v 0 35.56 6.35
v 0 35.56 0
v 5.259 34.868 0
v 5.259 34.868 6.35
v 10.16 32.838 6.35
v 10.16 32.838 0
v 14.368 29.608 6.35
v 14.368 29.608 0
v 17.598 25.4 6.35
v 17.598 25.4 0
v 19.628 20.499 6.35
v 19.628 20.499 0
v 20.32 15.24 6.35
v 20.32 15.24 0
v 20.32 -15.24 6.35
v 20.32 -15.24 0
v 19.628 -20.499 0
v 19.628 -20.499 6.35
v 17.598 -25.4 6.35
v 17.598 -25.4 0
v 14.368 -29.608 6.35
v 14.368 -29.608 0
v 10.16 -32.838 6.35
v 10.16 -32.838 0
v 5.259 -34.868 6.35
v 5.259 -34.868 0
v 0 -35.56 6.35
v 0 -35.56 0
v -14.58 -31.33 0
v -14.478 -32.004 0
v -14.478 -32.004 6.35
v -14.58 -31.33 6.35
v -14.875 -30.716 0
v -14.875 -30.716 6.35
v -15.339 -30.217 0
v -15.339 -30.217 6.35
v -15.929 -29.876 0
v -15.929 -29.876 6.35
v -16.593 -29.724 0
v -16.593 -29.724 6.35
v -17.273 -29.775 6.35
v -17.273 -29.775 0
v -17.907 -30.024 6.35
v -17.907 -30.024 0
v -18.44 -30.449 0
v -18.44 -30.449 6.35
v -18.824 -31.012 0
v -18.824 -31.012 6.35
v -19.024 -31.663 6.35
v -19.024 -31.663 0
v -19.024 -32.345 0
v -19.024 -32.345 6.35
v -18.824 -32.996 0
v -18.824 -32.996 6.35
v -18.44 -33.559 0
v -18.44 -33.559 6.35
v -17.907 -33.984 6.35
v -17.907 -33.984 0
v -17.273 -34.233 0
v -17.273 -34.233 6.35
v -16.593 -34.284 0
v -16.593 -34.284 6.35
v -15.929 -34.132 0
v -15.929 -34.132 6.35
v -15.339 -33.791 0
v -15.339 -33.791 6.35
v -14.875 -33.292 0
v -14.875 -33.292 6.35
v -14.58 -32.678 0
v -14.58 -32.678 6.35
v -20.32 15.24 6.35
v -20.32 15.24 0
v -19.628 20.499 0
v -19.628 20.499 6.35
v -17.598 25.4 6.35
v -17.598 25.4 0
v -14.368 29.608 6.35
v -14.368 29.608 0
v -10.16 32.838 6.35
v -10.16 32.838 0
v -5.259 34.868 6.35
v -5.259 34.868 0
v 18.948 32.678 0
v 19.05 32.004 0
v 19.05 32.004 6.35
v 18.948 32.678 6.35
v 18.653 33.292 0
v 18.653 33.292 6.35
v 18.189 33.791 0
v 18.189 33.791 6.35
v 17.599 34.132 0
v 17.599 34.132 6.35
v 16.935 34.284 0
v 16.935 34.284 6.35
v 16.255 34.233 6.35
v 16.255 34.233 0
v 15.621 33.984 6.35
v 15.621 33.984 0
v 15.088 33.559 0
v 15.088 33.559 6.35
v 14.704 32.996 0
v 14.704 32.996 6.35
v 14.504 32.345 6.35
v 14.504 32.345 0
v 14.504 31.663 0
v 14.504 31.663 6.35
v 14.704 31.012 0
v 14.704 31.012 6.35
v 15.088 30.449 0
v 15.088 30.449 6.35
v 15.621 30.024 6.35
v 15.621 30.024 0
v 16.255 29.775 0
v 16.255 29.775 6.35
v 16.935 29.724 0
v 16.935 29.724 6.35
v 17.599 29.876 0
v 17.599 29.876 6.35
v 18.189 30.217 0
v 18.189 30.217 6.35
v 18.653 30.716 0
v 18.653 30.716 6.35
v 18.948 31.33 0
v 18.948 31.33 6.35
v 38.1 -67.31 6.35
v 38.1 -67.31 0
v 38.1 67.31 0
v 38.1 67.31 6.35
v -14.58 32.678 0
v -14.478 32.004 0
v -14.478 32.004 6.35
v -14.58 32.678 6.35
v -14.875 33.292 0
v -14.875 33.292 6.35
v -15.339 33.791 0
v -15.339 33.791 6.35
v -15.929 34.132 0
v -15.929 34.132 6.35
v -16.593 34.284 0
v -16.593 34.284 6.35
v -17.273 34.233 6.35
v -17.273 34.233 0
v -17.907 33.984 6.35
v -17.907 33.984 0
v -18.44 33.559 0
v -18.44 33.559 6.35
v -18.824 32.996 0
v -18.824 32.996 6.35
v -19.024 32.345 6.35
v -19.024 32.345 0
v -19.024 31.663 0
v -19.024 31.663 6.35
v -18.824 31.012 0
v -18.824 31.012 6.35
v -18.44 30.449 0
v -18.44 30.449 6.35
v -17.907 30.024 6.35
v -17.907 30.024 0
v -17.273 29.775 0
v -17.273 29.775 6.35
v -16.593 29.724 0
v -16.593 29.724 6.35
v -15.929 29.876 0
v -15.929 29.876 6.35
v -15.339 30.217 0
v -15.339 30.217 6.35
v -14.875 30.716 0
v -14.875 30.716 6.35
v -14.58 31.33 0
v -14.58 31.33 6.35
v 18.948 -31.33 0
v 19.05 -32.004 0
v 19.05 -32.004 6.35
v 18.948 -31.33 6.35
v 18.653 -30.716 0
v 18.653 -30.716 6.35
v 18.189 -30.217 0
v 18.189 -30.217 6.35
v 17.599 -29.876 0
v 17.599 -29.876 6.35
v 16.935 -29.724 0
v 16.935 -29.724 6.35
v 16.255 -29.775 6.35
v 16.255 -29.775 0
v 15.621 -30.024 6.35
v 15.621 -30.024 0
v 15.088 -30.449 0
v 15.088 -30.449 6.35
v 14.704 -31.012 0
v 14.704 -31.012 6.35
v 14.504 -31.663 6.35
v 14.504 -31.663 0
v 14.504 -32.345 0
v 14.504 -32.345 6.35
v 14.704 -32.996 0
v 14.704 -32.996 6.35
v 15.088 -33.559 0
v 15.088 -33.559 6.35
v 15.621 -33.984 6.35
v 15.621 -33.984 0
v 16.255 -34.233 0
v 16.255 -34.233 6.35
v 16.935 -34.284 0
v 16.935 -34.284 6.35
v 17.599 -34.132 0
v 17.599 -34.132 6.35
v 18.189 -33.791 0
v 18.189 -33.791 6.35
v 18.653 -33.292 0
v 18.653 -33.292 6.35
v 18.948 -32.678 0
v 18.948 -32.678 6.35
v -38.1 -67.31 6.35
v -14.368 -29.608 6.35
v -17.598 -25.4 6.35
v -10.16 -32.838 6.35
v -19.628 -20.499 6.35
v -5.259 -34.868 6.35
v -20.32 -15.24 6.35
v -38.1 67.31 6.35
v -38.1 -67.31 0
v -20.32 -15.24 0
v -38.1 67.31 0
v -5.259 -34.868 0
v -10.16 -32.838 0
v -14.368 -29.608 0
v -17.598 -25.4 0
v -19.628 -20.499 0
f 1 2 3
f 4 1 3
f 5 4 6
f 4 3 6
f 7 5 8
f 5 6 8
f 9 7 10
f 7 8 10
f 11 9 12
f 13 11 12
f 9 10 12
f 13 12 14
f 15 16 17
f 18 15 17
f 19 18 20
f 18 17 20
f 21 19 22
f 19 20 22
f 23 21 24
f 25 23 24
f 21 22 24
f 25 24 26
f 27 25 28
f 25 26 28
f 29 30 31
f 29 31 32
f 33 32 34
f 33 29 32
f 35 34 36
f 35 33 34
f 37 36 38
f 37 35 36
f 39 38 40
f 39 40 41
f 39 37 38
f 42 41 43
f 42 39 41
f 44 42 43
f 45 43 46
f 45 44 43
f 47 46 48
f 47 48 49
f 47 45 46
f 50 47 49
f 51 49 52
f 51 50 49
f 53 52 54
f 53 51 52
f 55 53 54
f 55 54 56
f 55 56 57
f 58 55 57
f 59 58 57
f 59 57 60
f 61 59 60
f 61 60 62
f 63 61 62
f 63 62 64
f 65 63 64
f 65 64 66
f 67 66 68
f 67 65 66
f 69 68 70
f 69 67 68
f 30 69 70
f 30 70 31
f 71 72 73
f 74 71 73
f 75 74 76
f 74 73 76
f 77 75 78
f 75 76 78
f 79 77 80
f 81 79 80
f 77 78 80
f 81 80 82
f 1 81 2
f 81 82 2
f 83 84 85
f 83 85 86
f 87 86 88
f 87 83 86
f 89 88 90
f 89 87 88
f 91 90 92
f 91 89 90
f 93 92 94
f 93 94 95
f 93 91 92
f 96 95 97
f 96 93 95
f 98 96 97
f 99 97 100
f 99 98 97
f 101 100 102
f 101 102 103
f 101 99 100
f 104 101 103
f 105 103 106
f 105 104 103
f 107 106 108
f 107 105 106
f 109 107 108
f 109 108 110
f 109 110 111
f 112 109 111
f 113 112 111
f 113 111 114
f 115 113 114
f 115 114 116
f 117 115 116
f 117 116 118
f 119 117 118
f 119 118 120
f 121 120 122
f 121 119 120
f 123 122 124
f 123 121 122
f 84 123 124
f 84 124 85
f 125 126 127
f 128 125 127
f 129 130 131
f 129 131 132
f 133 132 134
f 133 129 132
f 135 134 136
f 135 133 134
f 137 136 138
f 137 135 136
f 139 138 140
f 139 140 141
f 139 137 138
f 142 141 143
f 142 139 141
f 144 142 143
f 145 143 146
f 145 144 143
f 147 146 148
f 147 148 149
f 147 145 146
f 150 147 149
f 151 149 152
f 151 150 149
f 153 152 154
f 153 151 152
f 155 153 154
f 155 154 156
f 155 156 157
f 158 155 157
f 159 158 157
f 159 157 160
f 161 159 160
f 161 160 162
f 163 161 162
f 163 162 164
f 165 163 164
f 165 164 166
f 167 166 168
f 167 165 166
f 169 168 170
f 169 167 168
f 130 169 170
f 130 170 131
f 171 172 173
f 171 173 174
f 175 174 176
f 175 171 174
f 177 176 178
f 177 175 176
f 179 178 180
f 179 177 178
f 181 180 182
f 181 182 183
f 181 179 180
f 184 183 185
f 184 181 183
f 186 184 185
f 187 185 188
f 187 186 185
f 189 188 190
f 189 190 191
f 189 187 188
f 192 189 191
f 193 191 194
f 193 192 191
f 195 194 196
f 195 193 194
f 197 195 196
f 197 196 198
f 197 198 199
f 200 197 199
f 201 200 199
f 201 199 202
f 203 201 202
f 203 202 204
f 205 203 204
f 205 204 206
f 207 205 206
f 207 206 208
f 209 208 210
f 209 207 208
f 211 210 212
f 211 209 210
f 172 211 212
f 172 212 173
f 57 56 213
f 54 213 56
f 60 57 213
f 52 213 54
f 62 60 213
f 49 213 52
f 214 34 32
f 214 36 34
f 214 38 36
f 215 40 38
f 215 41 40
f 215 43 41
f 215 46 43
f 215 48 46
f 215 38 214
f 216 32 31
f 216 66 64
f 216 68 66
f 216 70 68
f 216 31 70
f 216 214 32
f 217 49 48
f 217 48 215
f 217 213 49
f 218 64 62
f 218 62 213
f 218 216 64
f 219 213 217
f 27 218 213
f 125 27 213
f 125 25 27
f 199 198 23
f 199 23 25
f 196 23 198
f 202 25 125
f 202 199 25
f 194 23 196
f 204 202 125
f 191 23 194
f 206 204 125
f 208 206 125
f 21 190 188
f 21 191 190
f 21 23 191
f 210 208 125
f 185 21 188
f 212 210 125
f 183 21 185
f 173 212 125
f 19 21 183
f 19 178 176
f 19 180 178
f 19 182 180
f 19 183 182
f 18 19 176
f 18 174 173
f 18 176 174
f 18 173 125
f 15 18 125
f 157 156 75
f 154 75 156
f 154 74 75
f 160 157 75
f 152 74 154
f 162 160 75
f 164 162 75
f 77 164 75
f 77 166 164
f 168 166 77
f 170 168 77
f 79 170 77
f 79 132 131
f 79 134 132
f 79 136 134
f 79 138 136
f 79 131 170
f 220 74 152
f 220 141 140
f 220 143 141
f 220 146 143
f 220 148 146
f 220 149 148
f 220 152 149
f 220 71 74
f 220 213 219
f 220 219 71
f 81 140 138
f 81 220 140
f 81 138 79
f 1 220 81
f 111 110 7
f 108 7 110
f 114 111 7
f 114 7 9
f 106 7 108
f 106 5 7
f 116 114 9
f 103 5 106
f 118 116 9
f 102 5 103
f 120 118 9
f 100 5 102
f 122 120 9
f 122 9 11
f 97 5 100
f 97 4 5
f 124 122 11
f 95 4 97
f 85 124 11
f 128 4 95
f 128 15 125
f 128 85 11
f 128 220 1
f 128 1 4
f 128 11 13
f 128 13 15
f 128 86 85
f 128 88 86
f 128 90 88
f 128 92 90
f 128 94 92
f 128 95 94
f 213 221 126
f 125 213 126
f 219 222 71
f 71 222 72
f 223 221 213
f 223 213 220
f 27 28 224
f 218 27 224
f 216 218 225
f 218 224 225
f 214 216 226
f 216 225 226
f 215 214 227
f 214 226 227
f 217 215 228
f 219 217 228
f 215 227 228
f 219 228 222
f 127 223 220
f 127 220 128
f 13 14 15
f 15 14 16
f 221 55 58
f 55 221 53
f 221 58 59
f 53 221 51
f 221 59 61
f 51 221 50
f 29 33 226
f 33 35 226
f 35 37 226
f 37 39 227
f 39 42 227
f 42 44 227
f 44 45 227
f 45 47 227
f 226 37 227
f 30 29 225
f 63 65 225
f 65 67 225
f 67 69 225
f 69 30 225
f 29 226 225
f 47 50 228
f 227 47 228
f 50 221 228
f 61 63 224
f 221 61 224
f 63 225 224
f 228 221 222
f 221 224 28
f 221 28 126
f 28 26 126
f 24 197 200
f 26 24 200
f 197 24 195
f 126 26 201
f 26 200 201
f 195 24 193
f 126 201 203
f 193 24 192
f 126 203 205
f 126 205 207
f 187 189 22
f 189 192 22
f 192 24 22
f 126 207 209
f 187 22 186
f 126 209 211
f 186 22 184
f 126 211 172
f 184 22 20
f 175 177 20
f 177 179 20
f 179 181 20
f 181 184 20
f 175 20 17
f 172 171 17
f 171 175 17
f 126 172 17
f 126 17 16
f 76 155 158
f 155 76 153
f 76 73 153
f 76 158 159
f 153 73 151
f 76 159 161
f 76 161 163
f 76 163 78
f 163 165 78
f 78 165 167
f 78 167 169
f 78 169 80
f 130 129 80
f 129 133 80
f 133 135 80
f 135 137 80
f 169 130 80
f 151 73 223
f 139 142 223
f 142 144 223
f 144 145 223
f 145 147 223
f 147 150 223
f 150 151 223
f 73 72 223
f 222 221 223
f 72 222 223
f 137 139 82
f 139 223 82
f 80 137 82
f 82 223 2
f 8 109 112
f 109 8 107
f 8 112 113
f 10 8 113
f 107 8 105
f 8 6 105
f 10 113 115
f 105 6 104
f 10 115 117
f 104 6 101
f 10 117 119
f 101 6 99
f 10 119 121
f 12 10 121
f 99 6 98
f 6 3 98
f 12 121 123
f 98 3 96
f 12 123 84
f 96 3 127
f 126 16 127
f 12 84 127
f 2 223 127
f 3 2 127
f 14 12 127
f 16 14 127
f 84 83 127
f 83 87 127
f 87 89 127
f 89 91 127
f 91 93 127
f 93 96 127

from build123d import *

# Parameters (mm, degrees)
F0_W     = 76.2
F0_H     = 134.62
F0_R     = 2.286
F1_DEPTH = 6.35


with BuildPart() as f1:
    # F0 (on Top) → F1 (new body)
    with BuildSketch(Plane.XY):
        Rectangle(F0_W, F0_H)
        Polygon((0, 35.56), (20.32, 35.56), (20.32, 15.24), (20.32, -15.24), (20.32, -35.56), (0, -35.56), (-20.32, -35.56), (-20.32, -15.24), (-20.32, 15.24), (-20.32, 35.56), align=None, mode=Mode.SUBTRACT)
        with BuildLine():
            ThreePointArc((0, -35.56), (-14.36841, -29.60841), (-20.32, -15.24))
            Line((-20.32, -15.24), (-20.32, -35.56))
            Line((-20.32, -35.56), (0, -35.56))
        make_face()
        with Locations((-16.764, -32.004)):
            Circle(F0_R, mode=Mode.SUBTRACT)
        with BuildLine():
            Line((20.32, -35.56), (20.32, -15.24))
            ThreePointArc((20.32, -15.24), (14.36841, -29.60841), (0, -35.56))
            Line((0, -35.56), (20.32, -35.56))
        make_face()
        with Locations((16.764, -32.004)):
            Circle(F0_R, mode=Mode.SUBTRACT)
        with BuildLine():
            ThreePointArc((-20.32, 15.24), (-14.36841, 29.60841), (0, 35.56))
            Line((0, 35.56), (-20.32, 35.56))
            Line((-20.32, 35.56), (-20.32, 15.24))
        make_face()
        with Locations((-16.764, 32.004)):
            Circle(F0_R, mode=Mode.SUBTRACT)
        with BuildLine():
            Line((20.32, 15.24), (20.32, 35.56))
            Line((20.32, 35.56), (0, 35.56))
            ThreePointArc((0, 35.56), (14.36841, 29.60841), (20.32, 15.24))
        make_face()
        with Locations((16.764, 32.004)):
            Circle(F0_R, mode=Mode.SUBTRACT)
    extrude(amount=F1_DEPTH)


solid = f1.part
